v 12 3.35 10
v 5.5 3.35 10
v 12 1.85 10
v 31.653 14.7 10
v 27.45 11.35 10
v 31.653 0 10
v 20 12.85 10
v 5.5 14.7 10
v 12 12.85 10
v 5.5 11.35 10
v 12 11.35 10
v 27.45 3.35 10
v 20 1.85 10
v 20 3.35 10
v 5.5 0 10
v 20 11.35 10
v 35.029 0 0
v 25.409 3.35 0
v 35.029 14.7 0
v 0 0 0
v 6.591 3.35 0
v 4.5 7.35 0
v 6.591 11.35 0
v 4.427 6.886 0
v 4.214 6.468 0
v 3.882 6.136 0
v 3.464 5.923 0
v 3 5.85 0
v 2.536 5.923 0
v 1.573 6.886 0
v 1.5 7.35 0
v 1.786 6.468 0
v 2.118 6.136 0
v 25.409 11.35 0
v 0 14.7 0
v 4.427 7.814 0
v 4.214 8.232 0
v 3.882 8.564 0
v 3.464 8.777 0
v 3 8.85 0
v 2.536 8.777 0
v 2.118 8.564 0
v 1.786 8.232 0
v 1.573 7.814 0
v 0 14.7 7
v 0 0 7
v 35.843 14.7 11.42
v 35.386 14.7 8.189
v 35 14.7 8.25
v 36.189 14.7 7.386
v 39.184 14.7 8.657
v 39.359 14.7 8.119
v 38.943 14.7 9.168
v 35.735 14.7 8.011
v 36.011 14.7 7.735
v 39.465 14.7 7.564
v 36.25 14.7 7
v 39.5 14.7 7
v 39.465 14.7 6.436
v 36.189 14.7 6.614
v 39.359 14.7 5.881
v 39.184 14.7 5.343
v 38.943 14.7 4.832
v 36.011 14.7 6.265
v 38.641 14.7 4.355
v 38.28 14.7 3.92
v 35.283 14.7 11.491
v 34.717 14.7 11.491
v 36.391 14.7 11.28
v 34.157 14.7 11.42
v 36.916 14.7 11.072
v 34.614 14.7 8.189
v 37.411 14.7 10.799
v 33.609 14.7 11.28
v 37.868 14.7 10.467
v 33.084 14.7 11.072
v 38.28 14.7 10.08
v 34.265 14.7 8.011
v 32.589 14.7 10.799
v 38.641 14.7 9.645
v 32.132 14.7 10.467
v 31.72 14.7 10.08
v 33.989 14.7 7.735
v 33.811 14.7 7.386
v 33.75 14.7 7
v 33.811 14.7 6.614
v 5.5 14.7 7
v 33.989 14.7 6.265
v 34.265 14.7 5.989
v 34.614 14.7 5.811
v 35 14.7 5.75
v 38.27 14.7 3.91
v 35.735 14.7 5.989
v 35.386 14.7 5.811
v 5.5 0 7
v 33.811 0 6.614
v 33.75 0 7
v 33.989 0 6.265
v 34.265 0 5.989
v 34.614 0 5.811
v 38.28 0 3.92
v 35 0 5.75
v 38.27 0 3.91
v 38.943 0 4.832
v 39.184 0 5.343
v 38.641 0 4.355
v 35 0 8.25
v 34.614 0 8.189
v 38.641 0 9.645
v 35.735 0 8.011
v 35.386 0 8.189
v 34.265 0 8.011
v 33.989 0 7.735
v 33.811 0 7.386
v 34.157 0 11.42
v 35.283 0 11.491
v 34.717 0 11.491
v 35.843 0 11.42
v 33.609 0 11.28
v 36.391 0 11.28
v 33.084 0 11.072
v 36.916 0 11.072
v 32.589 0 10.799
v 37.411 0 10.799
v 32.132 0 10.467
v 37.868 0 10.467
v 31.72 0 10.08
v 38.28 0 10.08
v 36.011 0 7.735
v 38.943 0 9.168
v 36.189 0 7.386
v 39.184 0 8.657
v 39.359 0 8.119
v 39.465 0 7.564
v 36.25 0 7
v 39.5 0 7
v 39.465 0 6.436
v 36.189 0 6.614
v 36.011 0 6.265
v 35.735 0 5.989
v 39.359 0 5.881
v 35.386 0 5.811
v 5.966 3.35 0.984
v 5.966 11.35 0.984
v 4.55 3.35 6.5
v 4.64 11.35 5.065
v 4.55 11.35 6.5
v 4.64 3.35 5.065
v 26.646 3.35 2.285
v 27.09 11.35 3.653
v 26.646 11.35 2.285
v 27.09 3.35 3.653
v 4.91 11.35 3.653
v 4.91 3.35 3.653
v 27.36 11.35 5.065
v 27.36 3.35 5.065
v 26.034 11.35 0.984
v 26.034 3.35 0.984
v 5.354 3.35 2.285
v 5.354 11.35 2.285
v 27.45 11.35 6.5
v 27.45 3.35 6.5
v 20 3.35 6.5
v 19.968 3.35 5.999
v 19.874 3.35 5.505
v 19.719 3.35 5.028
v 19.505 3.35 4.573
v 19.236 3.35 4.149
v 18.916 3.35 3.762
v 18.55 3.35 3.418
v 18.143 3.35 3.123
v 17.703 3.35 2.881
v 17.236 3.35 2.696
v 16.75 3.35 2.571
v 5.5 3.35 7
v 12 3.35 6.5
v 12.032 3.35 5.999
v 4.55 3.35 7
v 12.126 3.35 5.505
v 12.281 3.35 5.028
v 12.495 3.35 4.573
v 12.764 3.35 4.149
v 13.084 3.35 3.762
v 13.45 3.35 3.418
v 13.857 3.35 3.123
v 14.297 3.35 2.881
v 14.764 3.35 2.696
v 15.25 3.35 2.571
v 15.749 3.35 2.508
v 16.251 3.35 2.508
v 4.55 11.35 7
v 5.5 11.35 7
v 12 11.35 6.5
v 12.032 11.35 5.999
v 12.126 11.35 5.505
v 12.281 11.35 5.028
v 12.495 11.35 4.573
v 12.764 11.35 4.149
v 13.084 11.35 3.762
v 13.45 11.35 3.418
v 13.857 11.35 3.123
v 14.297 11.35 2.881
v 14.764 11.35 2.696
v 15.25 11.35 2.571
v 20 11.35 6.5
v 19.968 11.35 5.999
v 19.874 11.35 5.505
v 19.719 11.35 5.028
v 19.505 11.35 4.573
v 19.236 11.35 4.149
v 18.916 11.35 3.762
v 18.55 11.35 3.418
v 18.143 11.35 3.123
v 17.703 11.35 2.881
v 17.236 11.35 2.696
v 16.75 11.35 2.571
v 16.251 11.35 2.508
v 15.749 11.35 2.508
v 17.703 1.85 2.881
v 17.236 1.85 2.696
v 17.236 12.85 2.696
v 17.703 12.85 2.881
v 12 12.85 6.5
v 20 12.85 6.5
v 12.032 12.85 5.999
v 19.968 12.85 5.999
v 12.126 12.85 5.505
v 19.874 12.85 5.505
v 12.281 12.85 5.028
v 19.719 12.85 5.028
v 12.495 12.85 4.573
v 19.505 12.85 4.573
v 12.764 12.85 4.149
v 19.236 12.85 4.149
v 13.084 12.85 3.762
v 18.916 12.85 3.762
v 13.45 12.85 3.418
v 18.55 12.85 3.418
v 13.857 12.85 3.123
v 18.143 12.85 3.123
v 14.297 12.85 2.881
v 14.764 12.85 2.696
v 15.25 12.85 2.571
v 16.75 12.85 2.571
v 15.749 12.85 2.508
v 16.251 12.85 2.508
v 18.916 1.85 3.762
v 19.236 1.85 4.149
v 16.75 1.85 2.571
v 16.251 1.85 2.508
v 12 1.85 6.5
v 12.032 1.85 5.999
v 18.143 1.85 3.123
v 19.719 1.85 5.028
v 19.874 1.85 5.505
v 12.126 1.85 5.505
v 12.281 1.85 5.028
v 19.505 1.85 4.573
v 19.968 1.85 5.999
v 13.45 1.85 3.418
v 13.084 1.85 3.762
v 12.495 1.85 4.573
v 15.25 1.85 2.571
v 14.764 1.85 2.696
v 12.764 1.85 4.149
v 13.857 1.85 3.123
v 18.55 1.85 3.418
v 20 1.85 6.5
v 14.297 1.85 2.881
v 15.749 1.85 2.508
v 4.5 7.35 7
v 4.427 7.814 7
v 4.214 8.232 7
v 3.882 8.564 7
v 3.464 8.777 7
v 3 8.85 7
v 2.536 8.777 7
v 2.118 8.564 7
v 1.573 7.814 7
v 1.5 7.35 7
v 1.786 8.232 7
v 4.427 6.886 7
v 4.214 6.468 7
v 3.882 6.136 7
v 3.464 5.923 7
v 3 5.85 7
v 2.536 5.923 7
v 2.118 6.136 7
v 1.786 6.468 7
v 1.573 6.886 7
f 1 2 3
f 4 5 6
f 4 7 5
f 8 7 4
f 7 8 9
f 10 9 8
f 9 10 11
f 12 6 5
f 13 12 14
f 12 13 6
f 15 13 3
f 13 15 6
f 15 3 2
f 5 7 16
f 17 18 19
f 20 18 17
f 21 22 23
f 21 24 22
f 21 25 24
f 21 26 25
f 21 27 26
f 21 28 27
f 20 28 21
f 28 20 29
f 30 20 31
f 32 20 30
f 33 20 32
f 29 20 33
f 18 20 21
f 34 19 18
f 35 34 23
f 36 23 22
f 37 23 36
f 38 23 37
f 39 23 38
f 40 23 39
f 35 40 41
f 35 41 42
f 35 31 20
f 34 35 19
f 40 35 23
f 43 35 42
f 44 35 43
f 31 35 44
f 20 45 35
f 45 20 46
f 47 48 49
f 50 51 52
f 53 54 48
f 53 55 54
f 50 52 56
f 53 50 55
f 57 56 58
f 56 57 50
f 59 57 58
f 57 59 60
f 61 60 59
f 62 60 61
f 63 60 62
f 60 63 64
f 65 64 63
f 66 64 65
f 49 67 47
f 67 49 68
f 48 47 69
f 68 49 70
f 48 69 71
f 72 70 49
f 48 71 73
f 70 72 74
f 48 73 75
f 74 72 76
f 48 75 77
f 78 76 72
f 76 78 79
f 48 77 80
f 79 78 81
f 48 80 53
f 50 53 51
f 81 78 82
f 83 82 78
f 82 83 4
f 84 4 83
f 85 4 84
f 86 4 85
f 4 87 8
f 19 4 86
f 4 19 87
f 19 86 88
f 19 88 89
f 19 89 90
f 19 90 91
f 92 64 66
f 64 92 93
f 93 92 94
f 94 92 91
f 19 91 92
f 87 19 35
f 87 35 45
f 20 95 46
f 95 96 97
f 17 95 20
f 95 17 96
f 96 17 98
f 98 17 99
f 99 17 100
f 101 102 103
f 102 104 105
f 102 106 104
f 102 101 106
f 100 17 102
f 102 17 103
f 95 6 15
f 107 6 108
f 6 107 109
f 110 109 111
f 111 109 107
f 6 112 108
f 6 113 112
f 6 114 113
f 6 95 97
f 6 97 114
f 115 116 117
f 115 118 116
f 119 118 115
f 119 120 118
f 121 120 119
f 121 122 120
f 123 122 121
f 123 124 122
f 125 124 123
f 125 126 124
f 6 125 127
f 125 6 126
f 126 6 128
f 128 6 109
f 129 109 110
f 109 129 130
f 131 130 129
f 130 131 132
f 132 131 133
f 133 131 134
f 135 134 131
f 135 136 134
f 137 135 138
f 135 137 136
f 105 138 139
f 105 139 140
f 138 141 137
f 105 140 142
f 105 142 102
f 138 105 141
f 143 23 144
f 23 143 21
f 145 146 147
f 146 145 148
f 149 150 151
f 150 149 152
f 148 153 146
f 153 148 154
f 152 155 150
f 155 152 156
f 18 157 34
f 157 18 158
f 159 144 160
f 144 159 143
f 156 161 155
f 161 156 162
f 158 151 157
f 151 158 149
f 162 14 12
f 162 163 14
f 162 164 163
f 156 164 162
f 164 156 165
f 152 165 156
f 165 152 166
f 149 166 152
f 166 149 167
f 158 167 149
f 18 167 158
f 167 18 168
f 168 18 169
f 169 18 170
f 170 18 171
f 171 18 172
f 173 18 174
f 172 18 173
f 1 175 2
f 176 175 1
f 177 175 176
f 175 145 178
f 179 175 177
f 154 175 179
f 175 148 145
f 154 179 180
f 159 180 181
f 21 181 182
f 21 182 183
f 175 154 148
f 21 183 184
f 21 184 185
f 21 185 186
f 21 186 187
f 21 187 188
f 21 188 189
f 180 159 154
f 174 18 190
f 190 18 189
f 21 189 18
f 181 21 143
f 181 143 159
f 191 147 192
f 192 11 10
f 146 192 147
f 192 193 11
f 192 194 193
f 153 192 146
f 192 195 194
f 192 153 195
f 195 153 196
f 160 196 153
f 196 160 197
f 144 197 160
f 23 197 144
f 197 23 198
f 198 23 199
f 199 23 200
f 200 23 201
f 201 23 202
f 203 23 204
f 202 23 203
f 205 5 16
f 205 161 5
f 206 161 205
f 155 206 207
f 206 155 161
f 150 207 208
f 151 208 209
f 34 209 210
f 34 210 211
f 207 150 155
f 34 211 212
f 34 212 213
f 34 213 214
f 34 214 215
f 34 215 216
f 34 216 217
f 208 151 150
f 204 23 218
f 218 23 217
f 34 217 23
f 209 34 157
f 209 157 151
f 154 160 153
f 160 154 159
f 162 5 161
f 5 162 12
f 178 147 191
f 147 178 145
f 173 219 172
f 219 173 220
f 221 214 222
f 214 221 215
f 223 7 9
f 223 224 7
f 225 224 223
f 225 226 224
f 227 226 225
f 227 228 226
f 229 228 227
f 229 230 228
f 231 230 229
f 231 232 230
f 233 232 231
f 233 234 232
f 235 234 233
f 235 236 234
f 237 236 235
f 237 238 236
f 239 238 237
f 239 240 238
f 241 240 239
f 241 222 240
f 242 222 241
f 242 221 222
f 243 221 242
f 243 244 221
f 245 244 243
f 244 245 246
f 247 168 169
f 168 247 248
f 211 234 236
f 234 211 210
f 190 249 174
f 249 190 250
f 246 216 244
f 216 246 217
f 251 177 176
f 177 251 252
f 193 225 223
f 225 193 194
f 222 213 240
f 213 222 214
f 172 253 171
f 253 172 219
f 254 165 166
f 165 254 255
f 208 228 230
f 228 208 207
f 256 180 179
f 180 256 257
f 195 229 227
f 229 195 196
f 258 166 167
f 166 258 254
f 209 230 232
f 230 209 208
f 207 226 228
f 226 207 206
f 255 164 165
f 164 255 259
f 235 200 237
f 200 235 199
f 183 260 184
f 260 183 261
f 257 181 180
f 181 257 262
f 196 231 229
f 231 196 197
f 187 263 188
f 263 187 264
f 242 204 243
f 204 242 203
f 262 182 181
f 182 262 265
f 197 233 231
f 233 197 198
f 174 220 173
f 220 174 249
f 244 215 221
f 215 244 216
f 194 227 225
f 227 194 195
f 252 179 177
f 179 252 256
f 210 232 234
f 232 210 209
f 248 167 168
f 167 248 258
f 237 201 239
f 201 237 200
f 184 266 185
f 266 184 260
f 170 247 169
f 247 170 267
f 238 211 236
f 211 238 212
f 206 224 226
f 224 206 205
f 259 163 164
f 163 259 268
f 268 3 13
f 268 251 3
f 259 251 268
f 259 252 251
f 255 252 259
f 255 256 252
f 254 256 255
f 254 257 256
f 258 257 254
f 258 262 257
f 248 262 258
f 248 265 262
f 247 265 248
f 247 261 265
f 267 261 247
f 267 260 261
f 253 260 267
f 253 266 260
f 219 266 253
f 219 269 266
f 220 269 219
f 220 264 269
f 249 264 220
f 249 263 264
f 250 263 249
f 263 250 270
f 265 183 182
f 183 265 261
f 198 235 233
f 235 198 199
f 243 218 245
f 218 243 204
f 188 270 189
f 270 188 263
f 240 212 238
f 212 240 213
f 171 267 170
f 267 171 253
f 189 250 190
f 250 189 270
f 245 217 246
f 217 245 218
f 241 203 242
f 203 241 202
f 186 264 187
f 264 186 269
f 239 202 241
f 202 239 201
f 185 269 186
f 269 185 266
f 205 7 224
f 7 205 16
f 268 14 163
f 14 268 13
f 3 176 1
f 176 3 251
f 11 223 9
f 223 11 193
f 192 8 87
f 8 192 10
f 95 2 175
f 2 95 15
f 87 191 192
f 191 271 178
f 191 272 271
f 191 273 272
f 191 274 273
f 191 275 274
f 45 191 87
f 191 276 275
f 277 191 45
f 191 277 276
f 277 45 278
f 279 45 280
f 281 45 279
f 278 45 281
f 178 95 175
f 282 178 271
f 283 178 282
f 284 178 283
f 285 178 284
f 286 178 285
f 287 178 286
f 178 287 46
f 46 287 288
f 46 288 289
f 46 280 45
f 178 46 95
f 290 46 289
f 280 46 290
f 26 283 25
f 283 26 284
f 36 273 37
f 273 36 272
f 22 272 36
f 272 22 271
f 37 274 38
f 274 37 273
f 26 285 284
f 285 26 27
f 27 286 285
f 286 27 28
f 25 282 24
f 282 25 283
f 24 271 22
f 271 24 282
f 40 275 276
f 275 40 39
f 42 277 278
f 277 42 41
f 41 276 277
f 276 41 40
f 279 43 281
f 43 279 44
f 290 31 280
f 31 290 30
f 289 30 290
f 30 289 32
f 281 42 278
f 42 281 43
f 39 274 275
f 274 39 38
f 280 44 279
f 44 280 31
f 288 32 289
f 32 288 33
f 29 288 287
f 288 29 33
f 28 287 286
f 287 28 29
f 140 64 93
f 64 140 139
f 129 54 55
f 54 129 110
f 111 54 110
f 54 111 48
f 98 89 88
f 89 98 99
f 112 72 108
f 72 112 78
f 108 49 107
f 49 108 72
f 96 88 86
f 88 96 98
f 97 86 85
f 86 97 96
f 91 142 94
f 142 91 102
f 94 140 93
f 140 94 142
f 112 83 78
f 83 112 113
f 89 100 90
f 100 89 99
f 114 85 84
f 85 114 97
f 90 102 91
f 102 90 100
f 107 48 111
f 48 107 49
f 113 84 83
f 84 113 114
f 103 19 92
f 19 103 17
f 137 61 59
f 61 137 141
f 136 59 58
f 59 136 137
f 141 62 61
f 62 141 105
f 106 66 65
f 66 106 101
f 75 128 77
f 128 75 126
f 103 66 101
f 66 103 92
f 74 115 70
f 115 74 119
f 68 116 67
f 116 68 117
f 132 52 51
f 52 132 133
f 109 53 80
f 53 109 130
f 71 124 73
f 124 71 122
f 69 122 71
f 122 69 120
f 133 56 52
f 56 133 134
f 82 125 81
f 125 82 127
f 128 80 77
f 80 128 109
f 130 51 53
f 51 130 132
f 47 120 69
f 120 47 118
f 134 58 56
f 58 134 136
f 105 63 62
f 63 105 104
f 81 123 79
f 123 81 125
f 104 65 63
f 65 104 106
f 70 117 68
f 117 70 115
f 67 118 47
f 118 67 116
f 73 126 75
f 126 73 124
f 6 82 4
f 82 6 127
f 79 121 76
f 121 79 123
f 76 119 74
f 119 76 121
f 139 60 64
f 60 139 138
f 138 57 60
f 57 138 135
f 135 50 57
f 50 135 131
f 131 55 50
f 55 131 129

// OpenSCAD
// file: halfcube.scad
module halfcube(a,orient,center) {
	translate(center==true?-a/2:0) {
		if (orient=="x")
			polyhedron (points = [[a[0],0,a[2]], [0,0,a[2]], [0,a[1],0], [0,0,0], [a[0],0,0], [a[0],a[1],0]], triangles = [[1,3,2], [4,0,5], [3,1,4], [1,2,5], [1,0,4], [0,1,5],  [5,2,4], [4,2,3]]);
		if (orient=="y")
			polyhedron (points = [[0,a[1],a[2]], [0,0,a[2]], [0,a[1],0], [0,0,0], [a[0],0,0], [a[0],a[1],0]], triangles = [[1,3,2], [1,2,0], [3,1,4], [0,2,5], [1,5,4], [1,0,5],  [5,2,4], [4,2,3]]);
		if (orient=="z")
			polyhedron (points = [[0,a[1],a[2]], [0,0,a[2]], [0,a[1],0], [0,0,0], [a[0],0,0], [a[0],0,a[2]]], triangles = [[1,3,2], [1,2,0], [3,1,4], [0,2,5], [1,5,4], [1,0,5],  [5,2,4], [4,2,3]]);
	}
}

//halfcube([10,20,30],"x",true);
//halfcube([10,20,30],"y",true);
//halfcube([10,20,30],"z",true);
// main file
include <halfcube.scad>
x=41.5-2;
y=14.7;
z=10;
z0=6.5;

d1=22.9;
d2=8;
d3=3;
d4=9;
d5=2.5;
x1=16;
h1=8;
h2=11;
z1=7;
union(){
difference(){
	cube([x,y,z]);
	translate([x1,y/2+h1/2,z0])rotate([90,0,0])cylinder(h1,r=d1/2,$fn=50);
	translate([x1,y/2,d1/2+z0])cube([d1,h1,d1],true);
	translate([x1,y/2+h2/2,z0])rotate([90,0,0])cylinder(h2,r=d2/2,$fn=50);
	translate([x1,y/2,d2/2+z0])cube([d2,h2,d2],true);

	translate([-1,-1,z-3])cube([6.5,y+2,4]);
	translate([3,y/2,-1])cylinder(z+2,r=d3/2,$fn=20);

	translate([x-4.5,-1,z1])rotate([-90,0,0])cylinder(y+2,r=d5/2,$fn=20);
	translate([x-4.5,-1,z1])rotate([0,40,0])cube([d4,y+2,d4]);
	//translate([x-4.5,-1,-1])cube([d4,y+2,z+2]);
	translate([x+1,-1,-1])rotate([0,-90,0])halfcube([7.6,y+2,6.3],"y");
}
difference(){
	translate([x-4.5,0,z1])rotate([-90,0,0])cylinder(y,r=d4/2,$fn=50);
	translate([x-4.5,-1,z1])rotate([-90,0,0])cylinder(y+2,r=d5/2,$fn=20);
}
}
